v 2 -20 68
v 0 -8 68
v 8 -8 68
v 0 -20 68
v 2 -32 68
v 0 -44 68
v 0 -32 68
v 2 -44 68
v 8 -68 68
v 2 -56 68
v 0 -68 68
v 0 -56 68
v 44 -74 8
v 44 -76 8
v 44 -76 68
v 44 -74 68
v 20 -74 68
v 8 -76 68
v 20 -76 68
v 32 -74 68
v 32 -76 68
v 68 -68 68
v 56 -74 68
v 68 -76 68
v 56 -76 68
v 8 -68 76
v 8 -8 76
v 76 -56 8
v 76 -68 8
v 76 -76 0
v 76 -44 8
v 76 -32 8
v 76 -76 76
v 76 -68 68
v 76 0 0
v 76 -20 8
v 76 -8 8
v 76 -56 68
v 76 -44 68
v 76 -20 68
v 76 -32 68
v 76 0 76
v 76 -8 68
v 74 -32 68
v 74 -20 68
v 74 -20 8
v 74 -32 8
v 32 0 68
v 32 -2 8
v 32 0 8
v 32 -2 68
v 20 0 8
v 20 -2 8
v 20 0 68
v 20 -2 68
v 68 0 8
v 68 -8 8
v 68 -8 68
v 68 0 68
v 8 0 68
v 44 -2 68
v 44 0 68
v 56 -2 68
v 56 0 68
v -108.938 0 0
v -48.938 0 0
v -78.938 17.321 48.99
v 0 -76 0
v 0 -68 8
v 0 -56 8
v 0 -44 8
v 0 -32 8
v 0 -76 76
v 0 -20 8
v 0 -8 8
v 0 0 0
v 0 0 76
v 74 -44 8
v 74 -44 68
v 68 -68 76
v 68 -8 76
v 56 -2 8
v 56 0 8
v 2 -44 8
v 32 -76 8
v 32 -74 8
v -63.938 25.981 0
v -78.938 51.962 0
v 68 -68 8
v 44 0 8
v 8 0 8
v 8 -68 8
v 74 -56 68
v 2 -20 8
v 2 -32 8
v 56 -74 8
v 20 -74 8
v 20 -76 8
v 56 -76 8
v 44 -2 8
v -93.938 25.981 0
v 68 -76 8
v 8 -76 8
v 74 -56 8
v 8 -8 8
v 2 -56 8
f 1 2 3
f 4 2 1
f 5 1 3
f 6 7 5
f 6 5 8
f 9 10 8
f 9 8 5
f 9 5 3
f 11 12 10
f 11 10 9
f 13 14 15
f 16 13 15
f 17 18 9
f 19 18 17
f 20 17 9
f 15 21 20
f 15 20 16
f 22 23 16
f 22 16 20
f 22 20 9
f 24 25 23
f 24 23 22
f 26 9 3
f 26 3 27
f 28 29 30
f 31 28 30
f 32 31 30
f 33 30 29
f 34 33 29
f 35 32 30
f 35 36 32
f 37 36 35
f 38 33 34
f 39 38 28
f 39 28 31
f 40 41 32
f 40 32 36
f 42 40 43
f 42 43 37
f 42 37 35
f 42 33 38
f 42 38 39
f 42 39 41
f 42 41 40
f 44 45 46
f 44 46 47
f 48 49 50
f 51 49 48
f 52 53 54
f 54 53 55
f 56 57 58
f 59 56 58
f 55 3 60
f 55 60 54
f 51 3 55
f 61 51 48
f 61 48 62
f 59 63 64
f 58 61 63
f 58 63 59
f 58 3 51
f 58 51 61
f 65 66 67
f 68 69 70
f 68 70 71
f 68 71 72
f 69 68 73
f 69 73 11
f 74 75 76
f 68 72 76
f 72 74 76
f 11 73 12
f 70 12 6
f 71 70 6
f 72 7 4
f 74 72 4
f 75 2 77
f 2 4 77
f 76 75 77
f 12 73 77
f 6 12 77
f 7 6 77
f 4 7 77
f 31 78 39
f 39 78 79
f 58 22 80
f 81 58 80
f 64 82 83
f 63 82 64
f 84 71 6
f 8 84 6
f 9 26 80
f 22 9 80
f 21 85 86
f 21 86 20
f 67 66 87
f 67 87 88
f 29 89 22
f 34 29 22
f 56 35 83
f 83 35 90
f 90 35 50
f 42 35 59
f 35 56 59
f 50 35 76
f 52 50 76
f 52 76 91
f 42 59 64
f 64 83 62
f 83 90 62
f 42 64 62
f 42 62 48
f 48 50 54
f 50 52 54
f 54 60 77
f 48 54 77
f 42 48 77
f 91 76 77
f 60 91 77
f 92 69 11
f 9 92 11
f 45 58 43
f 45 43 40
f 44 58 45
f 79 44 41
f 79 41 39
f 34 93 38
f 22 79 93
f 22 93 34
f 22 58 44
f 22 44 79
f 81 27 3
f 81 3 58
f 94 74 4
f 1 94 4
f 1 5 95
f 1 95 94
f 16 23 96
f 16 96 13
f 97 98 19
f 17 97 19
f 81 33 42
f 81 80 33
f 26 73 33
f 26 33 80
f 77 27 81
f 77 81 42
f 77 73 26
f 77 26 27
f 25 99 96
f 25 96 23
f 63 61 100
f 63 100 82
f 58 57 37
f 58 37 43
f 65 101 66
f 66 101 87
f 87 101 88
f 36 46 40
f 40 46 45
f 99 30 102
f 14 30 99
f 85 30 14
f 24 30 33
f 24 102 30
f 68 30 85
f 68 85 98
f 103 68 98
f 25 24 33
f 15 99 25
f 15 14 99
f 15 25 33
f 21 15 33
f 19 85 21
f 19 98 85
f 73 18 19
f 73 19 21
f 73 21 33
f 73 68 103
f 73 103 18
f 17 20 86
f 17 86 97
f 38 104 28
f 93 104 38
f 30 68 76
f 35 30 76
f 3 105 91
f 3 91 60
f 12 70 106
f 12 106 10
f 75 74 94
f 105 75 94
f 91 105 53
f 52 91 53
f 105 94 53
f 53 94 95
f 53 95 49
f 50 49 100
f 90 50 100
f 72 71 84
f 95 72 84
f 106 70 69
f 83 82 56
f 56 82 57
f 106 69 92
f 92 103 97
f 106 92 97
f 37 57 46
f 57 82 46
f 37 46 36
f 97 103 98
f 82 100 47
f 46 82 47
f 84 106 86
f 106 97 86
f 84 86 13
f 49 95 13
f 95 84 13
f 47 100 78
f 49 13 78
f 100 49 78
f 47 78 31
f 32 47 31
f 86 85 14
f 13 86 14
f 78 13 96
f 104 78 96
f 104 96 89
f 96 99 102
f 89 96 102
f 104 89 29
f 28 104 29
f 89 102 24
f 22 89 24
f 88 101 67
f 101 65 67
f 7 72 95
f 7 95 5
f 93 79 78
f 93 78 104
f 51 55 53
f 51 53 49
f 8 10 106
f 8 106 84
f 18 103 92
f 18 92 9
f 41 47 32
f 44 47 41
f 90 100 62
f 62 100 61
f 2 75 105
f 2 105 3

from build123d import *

# Parameters (mm, degrees)
F0_W      = 76
F0_H      = 76
F1_DEPTH  = 76
F2_W      = 60
F2_H      = 60
F3_DEPTH  = 68
F4_W      = 12
F4_H      = 60
F5_DEPTH  = 100
F6_W      = 12
F6_H      = 60
F7_DEPTH  = 6
F8_W      = 12
F8_H      = 60
F9_DEPTH  = 6
F10_W     = 12
F10_H     = 60
F11_DEPTH = 99
F12_W     = 12
F12_H     = 60
F13_DEPTH = 6
F14_W     = 12
F14_H     = 60
F15_DEPTH = 6
F17_DEPTH = 48.9897948557
F20_W     = 96.6173894703
F20_H     = 69.0555498004
F21_DEPTH = 25
F23_W     = 74.8236617073
F23_H     = 72.9810190387
F24_DEPTH = 25
F26_W     = 108.0368701369
F26_H     = 112.1664643288
F27_DEPTH = 25


# Not quite as in the source:
# - a feature names something its author has since deleted; it is built from what else it names


with BuildPart() as f1:
    # F0 (on Right) → F1 (new body)
    with BuildSketch(Plane.YZ):
        with Locations((-38, 38)):
            Rectangle(F0_W, F0_H)
    extrude(amount=F1_DEPTH)

    # F2 (on face) → F3 (cut)
    with BuildSketch(Plane.XY.offset(76)):
        with Locations((38, -38)):
            Rectangle(F2_W, F2_H)
    extrude(amount=-F3_DEPTH, mode=Mode.SUBTRACT)

    # F4 (on face) → F5 (cut)
    with BuildSketch(Plane.XZ.offset(76)):
        with Locations((14, 38)):
            Rectangle(F4_W, F4_H)
        with Locations((38, 38)):
            Rectangle(F4_W, F4_H)
        with Locations((62, 38)):
            Rectangle(F4_W, F4_H)
    extrude(amount=-F5_DEPTH, mode=Mode.SUBTRACT)

    # F6 (on face) → F7 (cut)
    with BuildSketch(Plane(origin=(0, -68, 0), x_dir=(-1, 0, 0), z_dir=(0, 1, 0))):
        with Locations((-50, 38)):
            Rectangle(F6_W, F6_H)
        with Locations((-26, 38)):
            Rectangle(F6_W, F6_H)
    extrude(amount=-F7_DEPTH, mode=Mode.SUBTRACT)

    # F8 (on face) → F9 (cut)
    with BuildSketch(Plane.XZ.offset(8)):
        with Locations((50, 38)):
            Rectangle(F8_W, F8_H)
        with Locations((26, 38)):
            Rectangle(F8_W, F8_H)
    extrude(amount=-F9_DEPTH, mode=Mode.SUBTRACT)

    # F10 (on face) → F11 (cut)
    with BuildSketch(Plane(origin=(0, 0, 0), x_dir=(0, -1, 0), z_dir=(-1, 0, 0))):
        with Locations((14, 38)):
            Rectangle(F10_W, F10_H)
        with Locations((38, 38)):
            Rectangle(F10_W, F10_H)
        with Locations((62, 38)):
            Rectangle(F10_W, F10_H)
    extrude(amount=-F11_DEPTH, mode=Mode.SUBTRACT)

    # F12 (on face) → F13 (cut)
    with BuildSketch(Plane.YZ.offset(8)):
        with Locations((-26, 38)):
            Rectangle(F12_W, F12_H)
        with Locations((-50, 38)):
            Rectangle(F12_W, F12_H)
    extrude(amount=-F13_DEPTH, mode=Mode.SUBTRACT)

    # F14 (on face) → F15 (cut)
    with BuildSketch(Plane(origin=(68, 0, 0), x_dir=(0, -1, 0), z_dir=(-1, 0, 0))):
        with Locations((50, 38)):
            Rectangle(F14_W, F14_H)
        with Locations((26, 38)):
            Rectangle(F14_W, F14_H)
    extrude(amount=-F15_DEPTH, mode=Mode.SUBTRACT)


with BuildPart() as f17:
    # F16 (on Top) → F17 (new body)
    with BuildSketch(Plane.XY):
        Polygon((-63.9376926764, 25.9807621135), (-78.9376926764, 17.3205080757), (-48.9376926764, 0), align=None)
        Polygon((-78.9376926764, 51.9615242271), (-78.9376926764, 17.3205080757), (-63.9376926764, 25.9807621135), align=None)
        Polygon((-78.9376926764, 51.9615242271), (-93.9376926764, 25.9807621135), (-78.9376926764, 17.3205080757), align=None)
        Polygon((-93.9376926764, 25.9807621135), (-108.9376926764, 0), (-78.9376926764, 17.3205080757), align=None)
        Polygon((-78.9376926764, 17.3205080757), (-108.9376926764, 0), (-78.9376926764, 0), align=None)
        Polygon((-78.9376926764, 17.3205080757), (-78.9376926764, 0), (-48.9376926764, 0), align=None)
    extrude(amount=F17_DEPTH)

    # F20 (on 3pt) → F21 (cut)
    with BuildSketch(Plane(origin=(-72.6251284509, 41.9301374611, 29.6490845348), x_dir=(0.4364357805, 0.8819171037, -0.1781741613), z_dir=(0.8164965809, -0.4714045208, -0.3333333333))):
        with Locations((-29.2243789881, -11.6772539914)):
            Rectangle(F20_W, F20_H)
    extrude(amount=-F21_DEPTH, mode=Mode.SUBTRACT)

    # F23 (on 3pt) → F24 (cut)
    with BuildSketch(Plane(origin=(-32.6251284509, -18.8361266935, -13.3191529162), x_dir=(-0.4364357805, 0.8819171037, -0.1781741613), z_dir=(0.8164965809, 0.4714045208, 0.3333333333))):
        with Locations((46.6394056566, 41.2203946617)):
            Rectangle(F23_W, F23_H)
    extrude(amount=F24_DEPTH, mode=Mode.SUBTRACT)

    # F26 (on 3pt) → F27 (cut)
    with BuildSketch(Plane(origin=(0, 0, 0), x_dir=(-1, 0, 0), z_dir=(0, 0.9428090416, -0.3333333333))):
        with Locations((71.1465058848, 24.1519138217)):
            Rectangle(F26_W, F26_H)
    extrude(amount=-F27_DEPTH, mode=Mode.SUBTRACT)


solid = Compound([f1.part, f17.part])
